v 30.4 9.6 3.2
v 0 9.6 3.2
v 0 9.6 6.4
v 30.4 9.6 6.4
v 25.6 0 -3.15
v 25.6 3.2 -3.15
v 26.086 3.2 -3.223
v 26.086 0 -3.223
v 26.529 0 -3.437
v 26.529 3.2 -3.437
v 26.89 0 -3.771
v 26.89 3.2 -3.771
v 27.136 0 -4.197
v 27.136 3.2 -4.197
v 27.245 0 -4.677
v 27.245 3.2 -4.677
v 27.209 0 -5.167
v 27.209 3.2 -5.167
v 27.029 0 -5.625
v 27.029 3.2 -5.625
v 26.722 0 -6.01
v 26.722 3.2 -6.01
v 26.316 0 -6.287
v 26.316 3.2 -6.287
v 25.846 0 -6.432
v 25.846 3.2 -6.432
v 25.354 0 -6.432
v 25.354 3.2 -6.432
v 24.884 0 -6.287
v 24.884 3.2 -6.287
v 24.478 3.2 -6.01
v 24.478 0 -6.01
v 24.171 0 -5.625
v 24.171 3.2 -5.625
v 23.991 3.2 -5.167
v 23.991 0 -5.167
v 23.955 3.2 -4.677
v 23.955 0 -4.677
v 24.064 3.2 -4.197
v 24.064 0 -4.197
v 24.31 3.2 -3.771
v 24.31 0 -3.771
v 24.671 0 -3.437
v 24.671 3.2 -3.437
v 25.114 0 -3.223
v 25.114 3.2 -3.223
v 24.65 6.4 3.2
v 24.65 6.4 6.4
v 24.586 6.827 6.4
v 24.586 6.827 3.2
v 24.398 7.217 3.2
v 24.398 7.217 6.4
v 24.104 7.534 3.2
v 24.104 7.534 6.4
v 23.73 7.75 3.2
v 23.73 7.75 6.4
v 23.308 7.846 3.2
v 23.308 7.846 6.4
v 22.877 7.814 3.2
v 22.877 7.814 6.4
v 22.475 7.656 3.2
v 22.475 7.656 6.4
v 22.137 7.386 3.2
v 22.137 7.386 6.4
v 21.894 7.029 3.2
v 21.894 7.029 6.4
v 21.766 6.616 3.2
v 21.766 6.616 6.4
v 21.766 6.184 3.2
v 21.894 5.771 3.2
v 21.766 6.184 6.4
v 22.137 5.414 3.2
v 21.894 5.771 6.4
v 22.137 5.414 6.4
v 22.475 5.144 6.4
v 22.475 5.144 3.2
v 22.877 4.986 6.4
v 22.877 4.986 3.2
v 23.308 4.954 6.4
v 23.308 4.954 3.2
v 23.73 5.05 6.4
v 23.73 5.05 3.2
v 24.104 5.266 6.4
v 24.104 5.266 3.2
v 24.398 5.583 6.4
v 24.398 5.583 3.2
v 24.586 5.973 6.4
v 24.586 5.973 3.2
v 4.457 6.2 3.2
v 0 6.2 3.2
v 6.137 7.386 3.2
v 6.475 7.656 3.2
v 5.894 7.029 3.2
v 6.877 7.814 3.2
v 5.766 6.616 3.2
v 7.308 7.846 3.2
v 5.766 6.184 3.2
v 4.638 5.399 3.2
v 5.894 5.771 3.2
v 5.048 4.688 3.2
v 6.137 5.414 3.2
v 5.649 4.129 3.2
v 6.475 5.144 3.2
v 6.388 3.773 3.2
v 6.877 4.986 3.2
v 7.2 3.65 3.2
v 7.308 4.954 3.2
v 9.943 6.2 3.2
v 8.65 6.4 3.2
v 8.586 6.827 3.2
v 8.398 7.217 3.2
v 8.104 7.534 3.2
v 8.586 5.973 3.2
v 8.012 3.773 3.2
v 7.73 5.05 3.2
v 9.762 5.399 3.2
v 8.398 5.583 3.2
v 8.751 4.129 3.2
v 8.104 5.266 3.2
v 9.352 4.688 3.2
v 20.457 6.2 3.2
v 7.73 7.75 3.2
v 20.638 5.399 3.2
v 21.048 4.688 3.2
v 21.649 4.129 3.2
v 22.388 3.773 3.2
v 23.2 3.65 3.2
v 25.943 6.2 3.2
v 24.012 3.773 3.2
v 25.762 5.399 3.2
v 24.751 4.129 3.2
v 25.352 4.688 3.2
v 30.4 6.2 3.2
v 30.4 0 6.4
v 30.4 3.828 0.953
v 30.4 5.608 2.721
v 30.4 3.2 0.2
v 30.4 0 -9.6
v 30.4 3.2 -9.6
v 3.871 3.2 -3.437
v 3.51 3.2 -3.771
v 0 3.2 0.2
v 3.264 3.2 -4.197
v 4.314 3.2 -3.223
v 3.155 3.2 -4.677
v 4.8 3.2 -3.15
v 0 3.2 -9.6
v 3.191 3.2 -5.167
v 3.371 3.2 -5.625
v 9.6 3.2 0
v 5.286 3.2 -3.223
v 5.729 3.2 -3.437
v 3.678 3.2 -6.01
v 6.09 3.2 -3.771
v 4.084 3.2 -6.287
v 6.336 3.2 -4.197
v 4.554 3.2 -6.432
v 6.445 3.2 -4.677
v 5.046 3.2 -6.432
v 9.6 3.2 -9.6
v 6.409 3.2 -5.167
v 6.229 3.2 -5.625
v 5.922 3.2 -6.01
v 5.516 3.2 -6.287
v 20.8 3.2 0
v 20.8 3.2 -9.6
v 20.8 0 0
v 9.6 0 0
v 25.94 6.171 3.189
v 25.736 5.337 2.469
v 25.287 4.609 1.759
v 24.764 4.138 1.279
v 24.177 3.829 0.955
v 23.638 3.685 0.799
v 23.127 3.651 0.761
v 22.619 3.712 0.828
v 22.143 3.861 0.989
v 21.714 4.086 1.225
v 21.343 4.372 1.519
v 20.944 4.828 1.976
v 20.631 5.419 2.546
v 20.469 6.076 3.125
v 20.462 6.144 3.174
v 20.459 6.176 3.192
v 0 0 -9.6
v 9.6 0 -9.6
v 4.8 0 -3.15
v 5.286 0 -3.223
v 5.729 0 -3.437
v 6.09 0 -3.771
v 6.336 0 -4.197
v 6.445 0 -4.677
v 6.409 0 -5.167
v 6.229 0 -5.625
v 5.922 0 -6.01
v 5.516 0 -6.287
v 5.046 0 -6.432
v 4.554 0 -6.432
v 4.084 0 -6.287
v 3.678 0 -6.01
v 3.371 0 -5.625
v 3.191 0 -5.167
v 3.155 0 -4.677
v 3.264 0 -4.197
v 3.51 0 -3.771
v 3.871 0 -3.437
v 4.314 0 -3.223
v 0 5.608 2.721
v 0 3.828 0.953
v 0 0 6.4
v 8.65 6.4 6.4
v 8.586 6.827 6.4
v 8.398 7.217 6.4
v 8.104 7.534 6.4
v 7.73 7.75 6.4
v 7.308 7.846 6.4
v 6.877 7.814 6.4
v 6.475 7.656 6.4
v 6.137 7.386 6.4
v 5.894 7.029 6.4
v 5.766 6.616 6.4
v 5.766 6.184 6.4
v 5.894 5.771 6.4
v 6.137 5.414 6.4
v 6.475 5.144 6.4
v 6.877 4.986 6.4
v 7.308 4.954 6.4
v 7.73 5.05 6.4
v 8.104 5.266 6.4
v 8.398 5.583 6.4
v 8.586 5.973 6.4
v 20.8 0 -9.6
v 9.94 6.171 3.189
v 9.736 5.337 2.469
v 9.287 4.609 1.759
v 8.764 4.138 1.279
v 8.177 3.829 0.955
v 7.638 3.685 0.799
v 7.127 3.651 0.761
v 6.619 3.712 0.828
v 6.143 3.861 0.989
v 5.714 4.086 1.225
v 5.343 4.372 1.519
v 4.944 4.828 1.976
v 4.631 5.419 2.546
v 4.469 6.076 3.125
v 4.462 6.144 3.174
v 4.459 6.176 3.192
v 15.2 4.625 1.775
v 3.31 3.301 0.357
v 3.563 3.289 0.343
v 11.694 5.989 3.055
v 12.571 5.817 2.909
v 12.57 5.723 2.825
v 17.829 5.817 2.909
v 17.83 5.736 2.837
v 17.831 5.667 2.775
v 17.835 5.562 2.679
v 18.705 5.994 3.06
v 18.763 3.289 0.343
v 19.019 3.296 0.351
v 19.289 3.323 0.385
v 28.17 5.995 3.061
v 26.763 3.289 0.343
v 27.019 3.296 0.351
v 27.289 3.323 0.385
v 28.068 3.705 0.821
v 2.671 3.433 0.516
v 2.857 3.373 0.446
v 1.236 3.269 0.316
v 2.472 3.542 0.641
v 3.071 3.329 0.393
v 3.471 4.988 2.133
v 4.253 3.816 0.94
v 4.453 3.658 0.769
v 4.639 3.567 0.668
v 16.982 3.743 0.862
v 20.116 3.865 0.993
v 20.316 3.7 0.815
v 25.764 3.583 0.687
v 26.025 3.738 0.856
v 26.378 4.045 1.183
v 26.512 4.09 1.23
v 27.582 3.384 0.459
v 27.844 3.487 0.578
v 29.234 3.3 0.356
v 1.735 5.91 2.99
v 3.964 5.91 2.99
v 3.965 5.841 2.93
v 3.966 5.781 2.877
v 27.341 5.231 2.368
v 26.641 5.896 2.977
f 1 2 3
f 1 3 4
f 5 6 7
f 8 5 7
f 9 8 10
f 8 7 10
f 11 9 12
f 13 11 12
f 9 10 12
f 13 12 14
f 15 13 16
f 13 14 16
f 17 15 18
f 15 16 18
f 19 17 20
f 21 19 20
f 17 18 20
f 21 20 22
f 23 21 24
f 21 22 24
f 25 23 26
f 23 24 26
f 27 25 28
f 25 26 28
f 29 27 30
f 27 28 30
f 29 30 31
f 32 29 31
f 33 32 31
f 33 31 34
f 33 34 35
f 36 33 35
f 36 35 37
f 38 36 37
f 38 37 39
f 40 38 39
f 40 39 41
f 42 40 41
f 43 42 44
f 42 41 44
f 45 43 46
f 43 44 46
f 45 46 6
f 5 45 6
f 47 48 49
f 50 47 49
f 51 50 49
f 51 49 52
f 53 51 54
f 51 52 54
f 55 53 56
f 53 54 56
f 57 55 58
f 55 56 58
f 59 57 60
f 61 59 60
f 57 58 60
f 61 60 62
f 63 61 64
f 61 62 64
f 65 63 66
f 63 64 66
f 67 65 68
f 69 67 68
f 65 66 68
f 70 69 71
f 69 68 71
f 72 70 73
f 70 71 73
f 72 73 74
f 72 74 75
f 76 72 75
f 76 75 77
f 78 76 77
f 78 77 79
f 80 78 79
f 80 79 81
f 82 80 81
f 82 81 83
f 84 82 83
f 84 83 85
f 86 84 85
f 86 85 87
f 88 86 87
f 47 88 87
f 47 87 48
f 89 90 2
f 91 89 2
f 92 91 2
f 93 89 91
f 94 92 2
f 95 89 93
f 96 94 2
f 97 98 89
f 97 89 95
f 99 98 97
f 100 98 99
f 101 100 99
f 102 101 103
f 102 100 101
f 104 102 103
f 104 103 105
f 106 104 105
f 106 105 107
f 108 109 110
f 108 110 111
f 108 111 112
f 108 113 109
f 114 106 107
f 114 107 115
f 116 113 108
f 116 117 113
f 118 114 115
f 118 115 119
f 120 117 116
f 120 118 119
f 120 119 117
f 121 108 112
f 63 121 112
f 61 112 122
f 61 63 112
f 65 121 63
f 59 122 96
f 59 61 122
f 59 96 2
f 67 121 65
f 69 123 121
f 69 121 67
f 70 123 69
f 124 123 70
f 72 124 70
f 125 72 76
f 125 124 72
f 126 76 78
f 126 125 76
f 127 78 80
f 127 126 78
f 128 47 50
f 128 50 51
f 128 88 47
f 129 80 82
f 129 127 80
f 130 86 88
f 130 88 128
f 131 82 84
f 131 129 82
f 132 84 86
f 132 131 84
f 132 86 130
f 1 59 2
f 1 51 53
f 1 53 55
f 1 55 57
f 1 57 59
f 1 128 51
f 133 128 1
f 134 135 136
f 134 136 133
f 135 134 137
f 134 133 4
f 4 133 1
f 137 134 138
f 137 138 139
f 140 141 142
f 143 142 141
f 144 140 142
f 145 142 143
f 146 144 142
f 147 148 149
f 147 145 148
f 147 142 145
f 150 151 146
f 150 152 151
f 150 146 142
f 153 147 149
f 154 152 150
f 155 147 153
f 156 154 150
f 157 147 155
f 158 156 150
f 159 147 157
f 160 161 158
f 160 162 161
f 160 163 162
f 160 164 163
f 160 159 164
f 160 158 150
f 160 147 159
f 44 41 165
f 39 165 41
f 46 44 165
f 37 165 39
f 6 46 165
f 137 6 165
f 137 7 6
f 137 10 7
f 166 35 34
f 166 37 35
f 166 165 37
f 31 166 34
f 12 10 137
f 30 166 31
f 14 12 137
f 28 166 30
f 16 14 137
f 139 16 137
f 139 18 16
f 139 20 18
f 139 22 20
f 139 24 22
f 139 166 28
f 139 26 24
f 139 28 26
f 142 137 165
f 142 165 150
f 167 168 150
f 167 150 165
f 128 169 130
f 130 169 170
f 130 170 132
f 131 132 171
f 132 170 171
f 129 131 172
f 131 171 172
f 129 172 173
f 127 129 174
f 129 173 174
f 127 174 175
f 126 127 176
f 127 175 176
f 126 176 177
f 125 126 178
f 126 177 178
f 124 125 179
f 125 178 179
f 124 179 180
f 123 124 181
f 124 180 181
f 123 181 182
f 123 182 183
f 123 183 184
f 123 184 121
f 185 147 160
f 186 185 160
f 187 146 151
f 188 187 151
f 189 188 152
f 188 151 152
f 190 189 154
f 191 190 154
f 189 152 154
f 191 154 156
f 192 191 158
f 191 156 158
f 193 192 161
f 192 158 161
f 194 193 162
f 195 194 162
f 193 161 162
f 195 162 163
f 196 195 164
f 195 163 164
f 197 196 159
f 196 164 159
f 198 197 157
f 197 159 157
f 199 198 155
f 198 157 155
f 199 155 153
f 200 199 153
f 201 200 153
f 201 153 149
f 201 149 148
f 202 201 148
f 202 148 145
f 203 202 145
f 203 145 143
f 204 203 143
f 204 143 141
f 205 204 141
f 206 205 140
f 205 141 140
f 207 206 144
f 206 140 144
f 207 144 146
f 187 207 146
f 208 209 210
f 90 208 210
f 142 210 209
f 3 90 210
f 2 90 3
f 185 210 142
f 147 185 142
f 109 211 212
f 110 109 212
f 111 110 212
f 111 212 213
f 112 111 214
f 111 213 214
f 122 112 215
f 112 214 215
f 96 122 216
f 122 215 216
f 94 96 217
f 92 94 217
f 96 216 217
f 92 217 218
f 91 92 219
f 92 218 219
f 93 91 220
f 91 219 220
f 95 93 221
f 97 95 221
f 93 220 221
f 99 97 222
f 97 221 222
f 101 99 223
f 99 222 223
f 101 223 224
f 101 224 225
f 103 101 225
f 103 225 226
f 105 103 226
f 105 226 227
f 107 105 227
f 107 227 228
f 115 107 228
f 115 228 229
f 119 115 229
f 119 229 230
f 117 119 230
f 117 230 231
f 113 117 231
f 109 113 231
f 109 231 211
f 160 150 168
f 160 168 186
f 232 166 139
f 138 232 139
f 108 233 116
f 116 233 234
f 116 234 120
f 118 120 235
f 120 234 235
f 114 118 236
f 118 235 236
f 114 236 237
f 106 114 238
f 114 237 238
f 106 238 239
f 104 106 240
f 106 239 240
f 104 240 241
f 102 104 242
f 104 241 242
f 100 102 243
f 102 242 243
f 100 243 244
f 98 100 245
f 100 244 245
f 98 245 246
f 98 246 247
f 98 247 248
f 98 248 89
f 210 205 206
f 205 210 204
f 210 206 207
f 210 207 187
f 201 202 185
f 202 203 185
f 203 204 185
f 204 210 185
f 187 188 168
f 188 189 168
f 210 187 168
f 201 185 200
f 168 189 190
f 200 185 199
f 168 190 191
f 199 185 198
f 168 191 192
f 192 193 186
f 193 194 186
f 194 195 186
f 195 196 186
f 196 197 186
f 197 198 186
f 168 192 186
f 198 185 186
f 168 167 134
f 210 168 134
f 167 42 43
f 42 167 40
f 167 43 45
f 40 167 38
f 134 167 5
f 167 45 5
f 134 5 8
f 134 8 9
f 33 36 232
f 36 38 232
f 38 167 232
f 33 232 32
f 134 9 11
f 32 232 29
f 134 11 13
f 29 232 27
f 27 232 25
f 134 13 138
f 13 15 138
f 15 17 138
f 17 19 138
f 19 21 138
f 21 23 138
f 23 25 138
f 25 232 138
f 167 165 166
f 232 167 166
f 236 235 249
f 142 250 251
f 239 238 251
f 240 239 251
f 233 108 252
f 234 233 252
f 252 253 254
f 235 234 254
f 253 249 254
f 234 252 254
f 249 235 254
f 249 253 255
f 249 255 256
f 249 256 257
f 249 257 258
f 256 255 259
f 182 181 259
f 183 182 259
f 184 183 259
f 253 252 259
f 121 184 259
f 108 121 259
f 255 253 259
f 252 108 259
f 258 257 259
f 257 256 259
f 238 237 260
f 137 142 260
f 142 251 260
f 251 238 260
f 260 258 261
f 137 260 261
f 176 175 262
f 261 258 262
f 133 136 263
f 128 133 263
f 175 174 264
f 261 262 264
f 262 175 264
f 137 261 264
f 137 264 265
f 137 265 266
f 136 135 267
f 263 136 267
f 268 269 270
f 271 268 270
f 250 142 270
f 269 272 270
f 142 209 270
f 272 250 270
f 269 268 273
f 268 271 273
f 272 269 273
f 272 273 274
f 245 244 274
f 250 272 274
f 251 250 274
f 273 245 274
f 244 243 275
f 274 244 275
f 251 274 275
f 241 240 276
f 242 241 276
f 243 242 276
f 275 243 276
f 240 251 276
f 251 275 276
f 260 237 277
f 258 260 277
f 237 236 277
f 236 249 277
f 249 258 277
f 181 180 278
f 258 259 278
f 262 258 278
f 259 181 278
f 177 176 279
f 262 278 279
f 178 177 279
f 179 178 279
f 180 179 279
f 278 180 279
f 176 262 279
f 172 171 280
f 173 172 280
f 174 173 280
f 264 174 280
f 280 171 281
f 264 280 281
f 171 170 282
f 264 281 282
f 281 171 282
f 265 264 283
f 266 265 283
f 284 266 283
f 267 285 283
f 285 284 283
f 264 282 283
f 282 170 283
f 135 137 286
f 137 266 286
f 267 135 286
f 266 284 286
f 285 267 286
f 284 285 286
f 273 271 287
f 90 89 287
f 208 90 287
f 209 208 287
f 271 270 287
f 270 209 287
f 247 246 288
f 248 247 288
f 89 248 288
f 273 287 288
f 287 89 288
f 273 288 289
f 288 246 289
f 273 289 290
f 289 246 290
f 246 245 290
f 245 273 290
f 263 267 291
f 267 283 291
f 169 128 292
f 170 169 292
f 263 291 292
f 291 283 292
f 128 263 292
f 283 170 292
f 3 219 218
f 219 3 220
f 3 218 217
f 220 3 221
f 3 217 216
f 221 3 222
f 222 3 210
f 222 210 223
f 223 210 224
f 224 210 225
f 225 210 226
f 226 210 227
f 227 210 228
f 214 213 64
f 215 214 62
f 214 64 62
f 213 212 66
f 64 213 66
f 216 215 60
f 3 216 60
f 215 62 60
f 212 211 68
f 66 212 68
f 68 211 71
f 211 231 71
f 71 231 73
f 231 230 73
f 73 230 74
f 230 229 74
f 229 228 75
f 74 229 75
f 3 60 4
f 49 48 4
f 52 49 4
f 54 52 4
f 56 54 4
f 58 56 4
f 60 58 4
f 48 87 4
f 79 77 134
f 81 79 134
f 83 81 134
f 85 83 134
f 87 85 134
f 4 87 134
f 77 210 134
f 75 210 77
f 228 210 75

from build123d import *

# Parameters (mm, degrees)
SKETCH1_W           = 30.4
SKETCH1_H           = 6.4
BOSS_EXTRUDE1_DEPTH = 3.2
SKETCH2_W           = 9.6
SKETCH2_H           = 9.6
SKETCH2_R           = 1.65
BOSS_EXTRUDE2_DEPTH = 3.2
SKETCH3_W           = 30.4
SKETCH3_H           = 3.2
BOSS_EXTRUDE3_DEPTH = 6.4
FILLET2_SIZE        = 3
SKETCH4_R           = 1.45
CUT_EXTRUDE1_DEPTH  = 24
SKETCH5_R           = 2.75
CUT_EXTRUDE2_DEPTH  = 4


with BuildPart() as part:
    # Sketch1 → Boss-Extrude1 (new body)
    with BuildSketch(Plane(origin=(0, 0, 0), x_dir=(1, 0, 0), z_dir=(0, 1, 0))):
        with Locations((15.2, -3.2)):
            Rectangle(SKETCH1_W, SKETCH1_H)
    extrude(amount=BOSS_EXTRUDE1_DEPTH)

    # Sketch2 → Boss-Extrude2 (add)
    # profile 1 of 2: a face of its own
    with BuildSketch(Plane(origin=(0, 3.2, 0), x_dir=(1, 0, 0), z_dir=(0, 1, 0))):
        with Locations((4.8, 4.8)):
            Rectangle(SKETCH2_W, SKETCH2_H)
        with Locations(Location((4.8, 4.8, 0), (0, 0, 270))):
            Circle(SKETCH2_R, mode=Mode.SUBTRACT)
    # profile 2 of 2: a face of its own
    with BuildSketch(Plane(origin=(0, 3.2, 0), x_dir=(1, 0, 0), z_dir=(0, 1, 0))):
        with Locations((25.6, 4.8)):
            Rectangle(SKETCH2_W, SKETCH2_H)
        with Locations(Location((25.6, 4.8, 0), (0, 0, 270))):
            Circle(SKETCH2_R, mode=Mode.SUBTRACT)
    extrude(amount=-BOSS_EXTRUDE2_DEPTH)

    # Sketch3 → Boss-Extrude3 (add)
    with BuildSketch(Plane(origin=(0, 3.2, 0), x_dir=(1, 0, 0), z_dir=(0, 1, 0))):
        with Locations((15.2, -4.8)):
            Rectangle(SKETCH3_W, SKETCH3_H)
    extrude(amount=BOSS_EXTRUDE3_DEPTH)

    # Fillet2
    # a fillet whose section is not a circle: 3 mm, written as the material it adds along each edge
    with BuildSketch(Plane(origin=(30.4, 3.2, 3.2), x_dir=(0, 1, 0), z_dir=(-1, 0, 0))) as fillet2_piece_1:
        with BuildLine():
            Bezier((FILLET2_SIZE, 0), (0, 0), (0, FILLET2_SIZE), weights=[1, 0.052631579, 1])
            Line((0, FILLET2_SIZE), (0, 0))
            Line((0, 0), (FILLET2_SIZE, 0))
        make_face()
    extrude(amount=30.4)

    # Sketch4 → Cut-Extrude1 (cut)
    with BuildSketch(Plane.XY.offset(6.4)):
        with Locations((7.2, 6.4)):
            Circle(SKETCH4_R)
        with Locations((23.2, 6.4)):
            Circle(SKETCH4_R)
    extrude(amount=-CUT_EXTRUDE1_DEPTH, mode=Mode.SUBTRACT)

    # Sketch5 → Cut-Extrude2 (cut)
    with BuildSketch(Plane(origin=(0, 0, -0.8), x_dir=(-1, 0, 0), z_dir=(0, 0, -1))):
        with Locations((-23.2, 6.4)):
            Circle(SKETCH5_R)
        with Locations((-7.2, 6.4)):
            Circle(SKETCH5_R)
    extrude(amount=-CUT_EXTRUDE2_DEPTH, mode=Mode.SUBTRACT)


solid = part.part
